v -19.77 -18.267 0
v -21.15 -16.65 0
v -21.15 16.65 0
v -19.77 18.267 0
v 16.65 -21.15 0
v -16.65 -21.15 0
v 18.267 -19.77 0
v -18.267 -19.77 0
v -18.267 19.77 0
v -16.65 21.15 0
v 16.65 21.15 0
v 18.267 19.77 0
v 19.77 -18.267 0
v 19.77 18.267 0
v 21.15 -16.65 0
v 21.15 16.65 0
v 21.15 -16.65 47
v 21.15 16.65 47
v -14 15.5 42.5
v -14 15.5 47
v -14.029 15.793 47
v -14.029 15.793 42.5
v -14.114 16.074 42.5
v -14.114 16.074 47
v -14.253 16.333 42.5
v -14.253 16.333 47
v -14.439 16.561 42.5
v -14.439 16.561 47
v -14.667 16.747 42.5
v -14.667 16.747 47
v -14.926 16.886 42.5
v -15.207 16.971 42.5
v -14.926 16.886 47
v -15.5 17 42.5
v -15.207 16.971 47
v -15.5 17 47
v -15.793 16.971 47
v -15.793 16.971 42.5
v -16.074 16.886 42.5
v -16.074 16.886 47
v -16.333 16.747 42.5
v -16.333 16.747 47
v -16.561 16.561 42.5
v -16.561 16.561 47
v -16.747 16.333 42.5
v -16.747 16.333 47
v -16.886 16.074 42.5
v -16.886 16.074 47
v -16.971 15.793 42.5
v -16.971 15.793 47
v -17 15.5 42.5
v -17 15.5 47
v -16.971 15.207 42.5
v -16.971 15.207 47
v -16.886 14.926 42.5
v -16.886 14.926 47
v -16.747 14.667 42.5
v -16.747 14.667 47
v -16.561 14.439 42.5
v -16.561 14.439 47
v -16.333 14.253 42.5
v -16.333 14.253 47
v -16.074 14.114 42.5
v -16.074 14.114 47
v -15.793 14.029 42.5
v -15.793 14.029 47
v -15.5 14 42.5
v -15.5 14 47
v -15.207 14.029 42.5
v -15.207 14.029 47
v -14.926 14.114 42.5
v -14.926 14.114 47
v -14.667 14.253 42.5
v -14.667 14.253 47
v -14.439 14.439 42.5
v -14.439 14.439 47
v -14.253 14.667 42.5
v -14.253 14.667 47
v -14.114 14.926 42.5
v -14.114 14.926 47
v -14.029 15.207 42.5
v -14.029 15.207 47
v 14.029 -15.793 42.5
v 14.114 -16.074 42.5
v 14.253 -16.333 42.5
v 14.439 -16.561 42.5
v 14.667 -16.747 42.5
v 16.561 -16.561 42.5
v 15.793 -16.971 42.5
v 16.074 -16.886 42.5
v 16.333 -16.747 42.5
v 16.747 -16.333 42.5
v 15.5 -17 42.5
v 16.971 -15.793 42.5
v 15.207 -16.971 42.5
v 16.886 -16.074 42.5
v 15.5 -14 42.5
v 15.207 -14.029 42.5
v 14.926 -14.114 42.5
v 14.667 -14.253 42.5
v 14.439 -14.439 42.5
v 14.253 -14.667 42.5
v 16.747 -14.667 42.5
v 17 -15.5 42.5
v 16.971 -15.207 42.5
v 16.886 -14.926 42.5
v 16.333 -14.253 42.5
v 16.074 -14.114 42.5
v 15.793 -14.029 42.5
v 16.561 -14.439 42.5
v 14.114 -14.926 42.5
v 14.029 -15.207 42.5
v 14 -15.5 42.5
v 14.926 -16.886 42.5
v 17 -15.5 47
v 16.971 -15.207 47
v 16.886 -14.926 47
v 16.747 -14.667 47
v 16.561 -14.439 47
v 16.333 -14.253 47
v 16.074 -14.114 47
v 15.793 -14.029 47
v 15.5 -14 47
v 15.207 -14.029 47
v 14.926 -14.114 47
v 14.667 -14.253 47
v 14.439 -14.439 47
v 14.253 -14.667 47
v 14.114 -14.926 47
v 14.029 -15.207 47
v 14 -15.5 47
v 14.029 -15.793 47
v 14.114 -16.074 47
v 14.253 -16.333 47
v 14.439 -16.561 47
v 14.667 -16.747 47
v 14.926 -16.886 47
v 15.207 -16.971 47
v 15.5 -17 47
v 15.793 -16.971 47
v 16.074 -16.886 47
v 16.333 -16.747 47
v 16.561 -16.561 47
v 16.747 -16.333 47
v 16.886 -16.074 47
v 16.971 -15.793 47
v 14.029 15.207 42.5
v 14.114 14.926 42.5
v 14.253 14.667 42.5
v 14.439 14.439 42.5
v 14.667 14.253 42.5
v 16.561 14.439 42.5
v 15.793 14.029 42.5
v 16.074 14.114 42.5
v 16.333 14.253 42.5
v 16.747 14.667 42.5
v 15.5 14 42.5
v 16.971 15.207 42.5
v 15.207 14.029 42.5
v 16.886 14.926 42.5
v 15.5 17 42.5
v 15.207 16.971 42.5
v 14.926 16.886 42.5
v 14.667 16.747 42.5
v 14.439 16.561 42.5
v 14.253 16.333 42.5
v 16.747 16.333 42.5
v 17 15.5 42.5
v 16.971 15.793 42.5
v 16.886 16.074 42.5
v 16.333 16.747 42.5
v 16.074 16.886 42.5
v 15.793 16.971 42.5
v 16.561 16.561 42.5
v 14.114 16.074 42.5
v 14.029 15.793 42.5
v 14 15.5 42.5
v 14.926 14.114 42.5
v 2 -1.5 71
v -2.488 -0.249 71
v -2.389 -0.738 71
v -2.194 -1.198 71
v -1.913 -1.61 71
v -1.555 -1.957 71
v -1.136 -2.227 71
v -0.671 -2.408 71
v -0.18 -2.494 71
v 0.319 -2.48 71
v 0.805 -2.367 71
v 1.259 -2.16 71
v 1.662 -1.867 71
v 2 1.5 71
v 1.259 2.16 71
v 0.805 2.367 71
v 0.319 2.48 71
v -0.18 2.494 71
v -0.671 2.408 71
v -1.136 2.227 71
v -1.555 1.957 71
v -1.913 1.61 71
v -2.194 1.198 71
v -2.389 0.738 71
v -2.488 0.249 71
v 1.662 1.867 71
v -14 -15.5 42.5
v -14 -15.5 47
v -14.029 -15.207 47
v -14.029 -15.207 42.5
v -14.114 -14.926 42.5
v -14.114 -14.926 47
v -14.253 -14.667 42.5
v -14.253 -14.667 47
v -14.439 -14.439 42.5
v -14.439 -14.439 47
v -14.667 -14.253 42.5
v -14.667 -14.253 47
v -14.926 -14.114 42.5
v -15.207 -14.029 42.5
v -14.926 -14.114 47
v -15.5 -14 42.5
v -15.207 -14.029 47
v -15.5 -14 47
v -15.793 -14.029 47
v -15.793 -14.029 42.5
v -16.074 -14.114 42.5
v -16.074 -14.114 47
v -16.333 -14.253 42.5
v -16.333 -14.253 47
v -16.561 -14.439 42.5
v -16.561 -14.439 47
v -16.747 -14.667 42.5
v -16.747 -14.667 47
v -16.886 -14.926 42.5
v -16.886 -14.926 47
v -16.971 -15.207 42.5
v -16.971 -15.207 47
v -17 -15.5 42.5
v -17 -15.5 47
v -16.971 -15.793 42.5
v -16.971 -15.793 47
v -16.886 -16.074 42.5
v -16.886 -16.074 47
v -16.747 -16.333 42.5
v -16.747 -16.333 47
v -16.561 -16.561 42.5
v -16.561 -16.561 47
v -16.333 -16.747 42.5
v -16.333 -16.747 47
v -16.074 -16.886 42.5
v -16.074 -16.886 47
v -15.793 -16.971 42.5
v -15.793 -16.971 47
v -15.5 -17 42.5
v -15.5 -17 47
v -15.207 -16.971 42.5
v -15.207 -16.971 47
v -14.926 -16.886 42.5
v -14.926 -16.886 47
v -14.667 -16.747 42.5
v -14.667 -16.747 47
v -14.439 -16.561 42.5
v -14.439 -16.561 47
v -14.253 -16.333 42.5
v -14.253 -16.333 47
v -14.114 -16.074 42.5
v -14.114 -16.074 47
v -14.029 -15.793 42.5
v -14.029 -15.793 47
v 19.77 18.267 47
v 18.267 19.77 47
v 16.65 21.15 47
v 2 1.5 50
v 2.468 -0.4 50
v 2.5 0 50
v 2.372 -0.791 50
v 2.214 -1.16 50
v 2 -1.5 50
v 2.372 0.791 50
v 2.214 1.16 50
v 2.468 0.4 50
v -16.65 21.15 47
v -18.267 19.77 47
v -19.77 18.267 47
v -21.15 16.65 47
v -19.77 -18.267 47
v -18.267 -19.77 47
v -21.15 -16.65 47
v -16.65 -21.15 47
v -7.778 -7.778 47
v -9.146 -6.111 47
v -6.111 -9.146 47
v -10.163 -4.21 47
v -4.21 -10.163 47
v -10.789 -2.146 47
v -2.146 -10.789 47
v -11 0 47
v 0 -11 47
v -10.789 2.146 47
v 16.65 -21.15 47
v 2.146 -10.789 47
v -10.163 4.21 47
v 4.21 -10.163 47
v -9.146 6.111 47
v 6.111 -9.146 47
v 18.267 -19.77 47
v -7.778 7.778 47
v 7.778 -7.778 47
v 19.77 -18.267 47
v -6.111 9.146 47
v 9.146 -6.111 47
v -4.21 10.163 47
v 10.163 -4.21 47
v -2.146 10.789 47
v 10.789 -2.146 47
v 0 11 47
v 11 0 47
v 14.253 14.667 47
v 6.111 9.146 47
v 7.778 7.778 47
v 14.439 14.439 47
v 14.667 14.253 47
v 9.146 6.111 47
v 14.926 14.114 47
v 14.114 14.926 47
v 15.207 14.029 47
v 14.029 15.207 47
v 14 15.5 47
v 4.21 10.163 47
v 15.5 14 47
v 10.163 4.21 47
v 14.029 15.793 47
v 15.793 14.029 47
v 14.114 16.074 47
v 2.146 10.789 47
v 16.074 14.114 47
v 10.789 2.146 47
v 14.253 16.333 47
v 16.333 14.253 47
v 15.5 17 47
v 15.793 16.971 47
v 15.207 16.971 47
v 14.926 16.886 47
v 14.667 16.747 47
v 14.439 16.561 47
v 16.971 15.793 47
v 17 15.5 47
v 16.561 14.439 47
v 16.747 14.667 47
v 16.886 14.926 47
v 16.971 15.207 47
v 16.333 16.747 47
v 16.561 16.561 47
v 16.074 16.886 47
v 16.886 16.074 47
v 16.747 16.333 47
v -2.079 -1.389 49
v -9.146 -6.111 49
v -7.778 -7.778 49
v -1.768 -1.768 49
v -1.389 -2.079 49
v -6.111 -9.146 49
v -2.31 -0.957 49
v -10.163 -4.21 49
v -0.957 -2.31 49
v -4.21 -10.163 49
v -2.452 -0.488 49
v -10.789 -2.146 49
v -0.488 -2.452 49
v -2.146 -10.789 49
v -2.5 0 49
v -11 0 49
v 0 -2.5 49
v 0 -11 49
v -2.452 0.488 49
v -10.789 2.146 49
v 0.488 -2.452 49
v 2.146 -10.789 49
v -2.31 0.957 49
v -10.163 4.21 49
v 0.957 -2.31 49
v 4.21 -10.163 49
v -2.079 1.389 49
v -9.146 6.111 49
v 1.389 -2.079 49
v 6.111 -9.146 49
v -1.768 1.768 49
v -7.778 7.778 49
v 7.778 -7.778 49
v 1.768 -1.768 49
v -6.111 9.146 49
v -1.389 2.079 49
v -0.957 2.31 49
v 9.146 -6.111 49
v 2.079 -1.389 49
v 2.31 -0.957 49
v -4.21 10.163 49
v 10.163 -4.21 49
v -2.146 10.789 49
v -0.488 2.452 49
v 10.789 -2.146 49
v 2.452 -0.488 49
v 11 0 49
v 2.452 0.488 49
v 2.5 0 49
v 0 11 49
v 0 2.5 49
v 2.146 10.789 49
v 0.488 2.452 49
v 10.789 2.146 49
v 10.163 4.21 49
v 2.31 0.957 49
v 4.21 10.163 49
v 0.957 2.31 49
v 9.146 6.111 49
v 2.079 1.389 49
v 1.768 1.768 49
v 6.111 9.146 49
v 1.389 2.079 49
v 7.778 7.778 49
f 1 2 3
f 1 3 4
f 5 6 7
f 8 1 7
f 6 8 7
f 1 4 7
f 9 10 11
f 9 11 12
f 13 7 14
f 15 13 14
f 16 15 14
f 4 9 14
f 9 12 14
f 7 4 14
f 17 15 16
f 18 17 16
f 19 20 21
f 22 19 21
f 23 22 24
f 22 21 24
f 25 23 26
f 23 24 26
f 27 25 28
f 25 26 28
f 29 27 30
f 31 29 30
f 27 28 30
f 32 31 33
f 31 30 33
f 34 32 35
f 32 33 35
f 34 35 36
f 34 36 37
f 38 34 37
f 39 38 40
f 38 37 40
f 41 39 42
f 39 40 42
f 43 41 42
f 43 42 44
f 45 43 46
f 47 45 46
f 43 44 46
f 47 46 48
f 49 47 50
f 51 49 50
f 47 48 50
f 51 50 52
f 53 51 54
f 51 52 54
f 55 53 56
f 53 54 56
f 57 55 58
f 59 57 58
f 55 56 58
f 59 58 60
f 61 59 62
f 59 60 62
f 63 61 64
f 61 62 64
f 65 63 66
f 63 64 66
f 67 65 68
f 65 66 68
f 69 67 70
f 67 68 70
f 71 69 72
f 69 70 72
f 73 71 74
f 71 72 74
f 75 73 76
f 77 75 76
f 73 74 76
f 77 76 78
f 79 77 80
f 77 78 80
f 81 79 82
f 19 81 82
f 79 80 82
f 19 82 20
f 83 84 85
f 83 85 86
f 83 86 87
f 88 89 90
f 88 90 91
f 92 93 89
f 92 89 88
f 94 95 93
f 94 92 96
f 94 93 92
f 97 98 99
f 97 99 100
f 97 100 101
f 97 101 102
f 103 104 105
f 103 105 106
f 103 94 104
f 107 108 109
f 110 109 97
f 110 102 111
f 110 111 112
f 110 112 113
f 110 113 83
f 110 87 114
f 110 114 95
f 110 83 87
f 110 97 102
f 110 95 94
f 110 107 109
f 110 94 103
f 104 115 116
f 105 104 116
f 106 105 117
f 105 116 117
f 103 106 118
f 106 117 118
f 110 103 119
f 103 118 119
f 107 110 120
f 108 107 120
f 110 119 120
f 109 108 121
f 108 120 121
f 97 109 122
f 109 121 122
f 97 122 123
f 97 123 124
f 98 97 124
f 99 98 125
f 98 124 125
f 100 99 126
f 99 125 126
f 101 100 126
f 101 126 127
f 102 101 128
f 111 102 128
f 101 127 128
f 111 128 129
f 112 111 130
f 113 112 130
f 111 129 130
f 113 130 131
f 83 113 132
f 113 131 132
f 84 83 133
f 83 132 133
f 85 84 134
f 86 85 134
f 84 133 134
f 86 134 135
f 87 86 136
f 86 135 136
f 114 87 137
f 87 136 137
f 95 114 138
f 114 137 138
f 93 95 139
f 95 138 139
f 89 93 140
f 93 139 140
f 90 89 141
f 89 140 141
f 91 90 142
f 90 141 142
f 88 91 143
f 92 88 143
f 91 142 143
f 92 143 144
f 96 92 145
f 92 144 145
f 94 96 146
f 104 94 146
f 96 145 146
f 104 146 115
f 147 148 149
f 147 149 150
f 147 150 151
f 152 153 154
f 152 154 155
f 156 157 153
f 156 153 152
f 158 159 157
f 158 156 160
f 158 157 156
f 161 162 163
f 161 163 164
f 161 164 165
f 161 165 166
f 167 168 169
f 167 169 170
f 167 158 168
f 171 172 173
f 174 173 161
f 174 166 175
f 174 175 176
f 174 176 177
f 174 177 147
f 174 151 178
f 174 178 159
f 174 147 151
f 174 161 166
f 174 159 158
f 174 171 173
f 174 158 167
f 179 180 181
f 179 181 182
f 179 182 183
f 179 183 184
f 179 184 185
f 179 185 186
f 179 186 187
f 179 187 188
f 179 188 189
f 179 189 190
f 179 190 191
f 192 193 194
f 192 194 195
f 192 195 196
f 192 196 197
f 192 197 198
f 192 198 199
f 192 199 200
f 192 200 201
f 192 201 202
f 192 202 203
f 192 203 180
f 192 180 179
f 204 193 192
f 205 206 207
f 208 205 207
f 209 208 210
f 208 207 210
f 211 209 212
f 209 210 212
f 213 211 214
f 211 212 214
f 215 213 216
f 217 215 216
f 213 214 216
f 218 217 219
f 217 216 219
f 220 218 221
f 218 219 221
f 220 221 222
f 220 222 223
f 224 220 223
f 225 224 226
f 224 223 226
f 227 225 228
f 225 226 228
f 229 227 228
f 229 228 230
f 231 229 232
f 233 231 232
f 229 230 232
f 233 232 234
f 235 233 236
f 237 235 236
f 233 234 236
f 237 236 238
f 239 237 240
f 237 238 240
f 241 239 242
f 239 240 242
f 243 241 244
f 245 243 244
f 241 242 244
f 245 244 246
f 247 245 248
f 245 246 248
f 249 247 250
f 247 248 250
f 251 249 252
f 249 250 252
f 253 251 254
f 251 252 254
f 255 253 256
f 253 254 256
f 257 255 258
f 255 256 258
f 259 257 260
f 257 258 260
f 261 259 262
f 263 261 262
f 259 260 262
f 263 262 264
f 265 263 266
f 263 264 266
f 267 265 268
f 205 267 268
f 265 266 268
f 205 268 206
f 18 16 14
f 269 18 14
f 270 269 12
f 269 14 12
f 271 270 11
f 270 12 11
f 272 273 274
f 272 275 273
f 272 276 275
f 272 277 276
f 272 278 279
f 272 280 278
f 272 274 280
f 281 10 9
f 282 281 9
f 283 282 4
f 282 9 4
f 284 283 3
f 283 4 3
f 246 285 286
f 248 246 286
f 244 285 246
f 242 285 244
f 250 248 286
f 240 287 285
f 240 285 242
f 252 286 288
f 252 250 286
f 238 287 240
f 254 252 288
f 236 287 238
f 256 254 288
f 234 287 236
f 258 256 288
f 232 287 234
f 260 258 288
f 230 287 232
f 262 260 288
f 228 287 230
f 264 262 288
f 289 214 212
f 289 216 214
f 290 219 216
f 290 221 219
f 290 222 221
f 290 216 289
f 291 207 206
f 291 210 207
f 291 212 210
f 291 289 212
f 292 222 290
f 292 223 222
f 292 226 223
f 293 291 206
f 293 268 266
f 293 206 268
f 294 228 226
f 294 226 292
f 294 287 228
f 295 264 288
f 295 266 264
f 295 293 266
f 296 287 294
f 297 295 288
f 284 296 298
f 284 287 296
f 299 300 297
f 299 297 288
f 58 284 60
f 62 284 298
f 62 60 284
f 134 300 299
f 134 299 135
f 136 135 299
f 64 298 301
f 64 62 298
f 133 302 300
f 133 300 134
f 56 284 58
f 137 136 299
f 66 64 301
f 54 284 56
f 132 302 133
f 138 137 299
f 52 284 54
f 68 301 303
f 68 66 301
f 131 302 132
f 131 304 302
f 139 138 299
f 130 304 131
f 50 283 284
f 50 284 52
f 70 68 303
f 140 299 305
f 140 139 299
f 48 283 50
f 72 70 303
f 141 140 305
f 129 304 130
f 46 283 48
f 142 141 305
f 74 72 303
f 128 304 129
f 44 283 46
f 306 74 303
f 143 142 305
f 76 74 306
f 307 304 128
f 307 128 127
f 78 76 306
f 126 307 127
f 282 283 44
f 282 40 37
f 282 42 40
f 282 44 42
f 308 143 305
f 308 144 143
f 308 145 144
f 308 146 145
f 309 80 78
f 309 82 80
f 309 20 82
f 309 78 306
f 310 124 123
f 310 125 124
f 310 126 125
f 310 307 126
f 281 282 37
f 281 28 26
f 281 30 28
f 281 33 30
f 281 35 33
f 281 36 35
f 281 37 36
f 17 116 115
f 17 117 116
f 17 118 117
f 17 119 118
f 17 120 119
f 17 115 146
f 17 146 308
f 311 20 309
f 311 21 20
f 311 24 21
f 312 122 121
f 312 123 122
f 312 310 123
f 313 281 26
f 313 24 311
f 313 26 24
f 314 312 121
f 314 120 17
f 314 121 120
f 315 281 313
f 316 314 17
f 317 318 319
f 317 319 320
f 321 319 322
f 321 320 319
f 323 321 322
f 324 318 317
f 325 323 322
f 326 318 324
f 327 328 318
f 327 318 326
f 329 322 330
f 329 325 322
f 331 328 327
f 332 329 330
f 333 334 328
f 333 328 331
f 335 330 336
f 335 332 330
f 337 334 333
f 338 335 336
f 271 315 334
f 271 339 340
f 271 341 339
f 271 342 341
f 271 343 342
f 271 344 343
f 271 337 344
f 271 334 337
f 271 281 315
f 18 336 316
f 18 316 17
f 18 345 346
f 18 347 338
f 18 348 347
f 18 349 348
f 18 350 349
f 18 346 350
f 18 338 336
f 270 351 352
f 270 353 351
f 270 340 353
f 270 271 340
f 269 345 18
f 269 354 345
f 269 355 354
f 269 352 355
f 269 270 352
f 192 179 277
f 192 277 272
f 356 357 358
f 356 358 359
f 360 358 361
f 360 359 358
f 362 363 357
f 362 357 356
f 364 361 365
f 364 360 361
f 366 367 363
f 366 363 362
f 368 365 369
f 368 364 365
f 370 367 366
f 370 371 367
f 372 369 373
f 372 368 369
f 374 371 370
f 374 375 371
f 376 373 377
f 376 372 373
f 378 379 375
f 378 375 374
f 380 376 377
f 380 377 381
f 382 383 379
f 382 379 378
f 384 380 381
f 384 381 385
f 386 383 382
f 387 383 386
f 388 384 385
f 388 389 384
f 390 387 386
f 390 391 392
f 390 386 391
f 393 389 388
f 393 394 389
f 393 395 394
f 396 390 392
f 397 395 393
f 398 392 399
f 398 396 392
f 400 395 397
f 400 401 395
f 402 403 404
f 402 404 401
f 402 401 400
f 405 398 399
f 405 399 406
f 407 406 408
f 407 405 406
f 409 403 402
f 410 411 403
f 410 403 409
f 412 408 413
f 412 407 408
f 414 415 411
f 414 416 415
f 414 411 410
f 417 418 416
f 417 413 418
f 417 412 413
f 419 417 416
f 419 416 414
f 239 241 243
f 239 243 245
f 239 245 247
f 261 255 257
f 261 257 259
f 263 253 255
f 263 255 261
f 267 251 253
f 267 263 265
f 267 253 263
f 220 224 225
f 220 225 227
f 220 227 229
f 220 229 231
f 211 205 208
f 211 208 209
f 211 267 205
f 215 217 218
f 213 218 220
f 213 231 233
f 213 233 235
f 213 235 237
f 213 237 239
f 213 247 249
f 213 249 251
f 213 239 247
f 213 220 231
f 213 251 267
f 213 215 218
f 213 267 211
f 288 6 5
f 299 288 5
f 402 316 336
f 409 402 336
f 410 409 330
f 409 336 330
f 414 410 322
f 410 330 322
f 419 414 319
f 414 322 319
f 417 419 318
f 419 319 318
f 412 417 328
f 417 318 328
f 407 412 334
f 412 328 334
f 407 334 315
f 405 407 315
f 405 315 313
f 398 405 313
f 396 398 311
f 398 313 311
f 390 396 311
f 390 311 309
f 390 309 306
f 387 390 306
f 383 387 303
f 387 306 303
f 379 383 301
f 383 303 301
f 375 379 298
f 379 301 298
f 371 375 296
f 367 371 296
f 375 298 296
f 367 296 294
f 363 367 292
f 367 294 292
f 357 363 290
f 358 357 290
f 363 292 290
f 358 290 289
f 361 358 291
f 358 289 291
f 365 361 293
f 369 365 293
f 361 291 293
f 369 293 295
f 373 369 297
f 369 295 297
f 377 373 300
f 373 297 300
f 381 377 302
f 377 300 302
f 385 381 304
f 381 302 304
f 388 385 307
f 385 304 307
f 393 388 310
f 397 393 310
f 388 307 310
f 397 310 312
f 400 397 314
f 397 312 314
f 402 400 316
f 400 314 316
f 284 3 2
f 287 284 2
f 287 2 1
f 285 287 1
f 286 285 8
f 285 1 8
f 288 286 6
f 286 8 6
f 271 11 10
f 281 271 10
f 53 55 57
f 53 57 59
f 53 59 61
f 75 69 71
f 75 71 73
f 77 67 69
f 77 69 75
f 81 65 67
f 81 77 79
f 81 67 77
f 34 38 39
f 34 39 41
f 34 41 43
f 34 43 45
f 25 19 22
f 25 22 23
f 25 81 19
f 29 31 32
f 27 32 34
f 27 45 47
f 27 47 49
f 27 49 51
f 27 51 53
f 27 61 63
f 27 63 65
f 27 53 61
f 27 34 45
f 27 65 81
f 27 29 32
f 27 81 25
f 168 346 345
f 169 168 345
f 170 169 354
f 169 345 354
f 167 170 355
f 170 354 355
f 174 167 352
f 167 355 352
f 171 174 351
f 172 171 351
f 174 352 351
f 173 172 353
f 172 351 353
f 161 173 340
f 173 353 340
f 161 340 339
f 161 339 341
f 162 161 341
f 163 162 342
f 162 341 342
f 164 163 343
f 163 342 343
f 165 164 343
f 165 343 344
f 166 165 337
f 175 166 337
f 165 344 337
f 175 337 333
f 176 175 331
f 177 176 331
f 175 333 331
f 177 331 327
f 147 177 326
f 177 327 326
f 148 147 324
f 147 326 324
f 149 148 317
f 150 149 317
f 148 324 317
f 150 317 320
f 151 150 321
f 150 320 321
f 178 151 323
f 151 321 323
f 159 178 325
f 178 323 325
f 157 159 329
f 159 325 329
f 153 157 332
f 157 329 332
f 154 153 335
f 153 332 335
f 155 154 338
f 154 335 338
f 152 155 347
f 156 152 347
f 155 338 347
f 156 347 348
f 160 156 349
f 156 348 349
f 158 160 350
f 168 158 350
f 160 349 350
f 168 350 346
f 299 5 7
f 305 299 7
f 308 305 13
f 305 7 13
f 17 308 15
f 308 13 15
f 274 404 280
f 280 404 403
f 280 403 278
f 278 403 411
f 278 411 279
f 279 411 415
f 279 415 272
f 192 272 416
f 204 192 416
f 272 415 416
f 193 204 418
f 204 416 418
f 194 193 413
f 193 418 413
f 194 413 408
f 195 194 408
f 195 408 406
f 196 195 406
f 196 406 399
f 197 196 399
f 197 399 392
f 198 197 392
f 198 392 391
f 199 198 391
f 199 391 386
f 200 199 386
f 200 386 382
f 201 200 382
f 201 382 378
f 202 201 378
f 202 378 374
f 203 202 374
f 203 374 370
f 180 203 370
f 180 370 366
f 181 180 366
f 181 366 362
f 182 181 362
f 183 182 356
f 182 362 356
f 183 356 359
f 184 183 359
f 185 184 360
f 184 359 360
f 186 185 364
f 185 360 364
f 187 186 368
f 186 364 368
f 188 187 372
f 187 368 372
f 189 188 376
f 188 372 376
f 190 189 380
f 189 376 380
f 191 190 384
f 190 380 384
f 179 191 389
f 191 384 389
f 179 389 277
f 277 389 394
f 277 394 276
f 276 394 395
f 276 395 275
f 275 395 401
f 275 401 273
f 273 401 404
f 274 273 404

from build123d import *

# Parameters (mm, degrees)
PAD_DEPTH       = 47
SKETCH001_R     = 11
PAD001_DEPTH    = 2
SKETCH002_R     = 2.5
PAD002_DEPTH    = 22
SKETCH003_W     = 1
SKETCH003_H     = 4
POCKET_DEPTH    = 21
SKETCH004_R     = 1.5
POCKET001_DEPTH = 4.5


with BuildPart() as part:
    # Sketch → Pad (new body)
    with BuildSketch(Plane.XY):
        with BuildLine():
            Line((-16.65, -21.15), (16.65, -21.15))
            ThreePointArc((16.65, -21.15), (19.033457, -19.033457), (21.15, -16.65))
            Line((21.15, -16.65), (21.15, 16.65))
            ThreePointArc((21.15, 16.65), (19.033457, 19.033457), (16.65, 21.15))
            Line((16.65, 21.15), (-16.65, 21.15))
            ThreePointArc((-16.65, 21.15), (-19.033457, 19.033457), (-21.15, 16.65))
            Line((-21.15, 16.65), (-21.15, -16.65))
            ThreePointArc((-21.15, -16.65), (-19.033457, -19.033457), (-16.65, -21.15))
        make_face()
    extrude(amount=PAD_DEPTH)

    # Sketch001 → Pad001 (new body)
    with BuildSketch(Plane.XY.offset(47)):
        Circle(SKETCH001_R)
    extrude(amount=PAD001_DEPTH)

    # Sketch002 → Pad002 (new body)
    with BuildSketch(Plane.XY.offset(49)):
        Circle(SKETCH002_R)
    extrude(amount=PAD002_DEPTH)

    # Sketch003 → Pocket (cut)
    with BuildSketch(Plane.XY.offset(71)):
        with Locations((2.5, 0)):
            Rectangle(SKETCH003_W, SKETCH003_H)
    extrude(amount=-POCKET_DEPTH, mode=Mode.SUBTRACT)

    # Sketch004 → Pocket001 (cut)
    with BuildSketch(Plane.XY.offset(47)):
        with Locations((-15.5, 15.5)):
            Circle(SKETCH004_R)
        with Locations((15.5, 15.5)):
            Circle(SKETCH004_R)
        with Locations((-15.5, -15.5)):
            Circle(SKETCH004_R)
        with Locations((15.5, -15.5)):
            Circle(SKETCH004_R)
    extrude(amount=-POCKET001_DEPTH, mode=Mode.SUBTRACT)


solid = part.part
